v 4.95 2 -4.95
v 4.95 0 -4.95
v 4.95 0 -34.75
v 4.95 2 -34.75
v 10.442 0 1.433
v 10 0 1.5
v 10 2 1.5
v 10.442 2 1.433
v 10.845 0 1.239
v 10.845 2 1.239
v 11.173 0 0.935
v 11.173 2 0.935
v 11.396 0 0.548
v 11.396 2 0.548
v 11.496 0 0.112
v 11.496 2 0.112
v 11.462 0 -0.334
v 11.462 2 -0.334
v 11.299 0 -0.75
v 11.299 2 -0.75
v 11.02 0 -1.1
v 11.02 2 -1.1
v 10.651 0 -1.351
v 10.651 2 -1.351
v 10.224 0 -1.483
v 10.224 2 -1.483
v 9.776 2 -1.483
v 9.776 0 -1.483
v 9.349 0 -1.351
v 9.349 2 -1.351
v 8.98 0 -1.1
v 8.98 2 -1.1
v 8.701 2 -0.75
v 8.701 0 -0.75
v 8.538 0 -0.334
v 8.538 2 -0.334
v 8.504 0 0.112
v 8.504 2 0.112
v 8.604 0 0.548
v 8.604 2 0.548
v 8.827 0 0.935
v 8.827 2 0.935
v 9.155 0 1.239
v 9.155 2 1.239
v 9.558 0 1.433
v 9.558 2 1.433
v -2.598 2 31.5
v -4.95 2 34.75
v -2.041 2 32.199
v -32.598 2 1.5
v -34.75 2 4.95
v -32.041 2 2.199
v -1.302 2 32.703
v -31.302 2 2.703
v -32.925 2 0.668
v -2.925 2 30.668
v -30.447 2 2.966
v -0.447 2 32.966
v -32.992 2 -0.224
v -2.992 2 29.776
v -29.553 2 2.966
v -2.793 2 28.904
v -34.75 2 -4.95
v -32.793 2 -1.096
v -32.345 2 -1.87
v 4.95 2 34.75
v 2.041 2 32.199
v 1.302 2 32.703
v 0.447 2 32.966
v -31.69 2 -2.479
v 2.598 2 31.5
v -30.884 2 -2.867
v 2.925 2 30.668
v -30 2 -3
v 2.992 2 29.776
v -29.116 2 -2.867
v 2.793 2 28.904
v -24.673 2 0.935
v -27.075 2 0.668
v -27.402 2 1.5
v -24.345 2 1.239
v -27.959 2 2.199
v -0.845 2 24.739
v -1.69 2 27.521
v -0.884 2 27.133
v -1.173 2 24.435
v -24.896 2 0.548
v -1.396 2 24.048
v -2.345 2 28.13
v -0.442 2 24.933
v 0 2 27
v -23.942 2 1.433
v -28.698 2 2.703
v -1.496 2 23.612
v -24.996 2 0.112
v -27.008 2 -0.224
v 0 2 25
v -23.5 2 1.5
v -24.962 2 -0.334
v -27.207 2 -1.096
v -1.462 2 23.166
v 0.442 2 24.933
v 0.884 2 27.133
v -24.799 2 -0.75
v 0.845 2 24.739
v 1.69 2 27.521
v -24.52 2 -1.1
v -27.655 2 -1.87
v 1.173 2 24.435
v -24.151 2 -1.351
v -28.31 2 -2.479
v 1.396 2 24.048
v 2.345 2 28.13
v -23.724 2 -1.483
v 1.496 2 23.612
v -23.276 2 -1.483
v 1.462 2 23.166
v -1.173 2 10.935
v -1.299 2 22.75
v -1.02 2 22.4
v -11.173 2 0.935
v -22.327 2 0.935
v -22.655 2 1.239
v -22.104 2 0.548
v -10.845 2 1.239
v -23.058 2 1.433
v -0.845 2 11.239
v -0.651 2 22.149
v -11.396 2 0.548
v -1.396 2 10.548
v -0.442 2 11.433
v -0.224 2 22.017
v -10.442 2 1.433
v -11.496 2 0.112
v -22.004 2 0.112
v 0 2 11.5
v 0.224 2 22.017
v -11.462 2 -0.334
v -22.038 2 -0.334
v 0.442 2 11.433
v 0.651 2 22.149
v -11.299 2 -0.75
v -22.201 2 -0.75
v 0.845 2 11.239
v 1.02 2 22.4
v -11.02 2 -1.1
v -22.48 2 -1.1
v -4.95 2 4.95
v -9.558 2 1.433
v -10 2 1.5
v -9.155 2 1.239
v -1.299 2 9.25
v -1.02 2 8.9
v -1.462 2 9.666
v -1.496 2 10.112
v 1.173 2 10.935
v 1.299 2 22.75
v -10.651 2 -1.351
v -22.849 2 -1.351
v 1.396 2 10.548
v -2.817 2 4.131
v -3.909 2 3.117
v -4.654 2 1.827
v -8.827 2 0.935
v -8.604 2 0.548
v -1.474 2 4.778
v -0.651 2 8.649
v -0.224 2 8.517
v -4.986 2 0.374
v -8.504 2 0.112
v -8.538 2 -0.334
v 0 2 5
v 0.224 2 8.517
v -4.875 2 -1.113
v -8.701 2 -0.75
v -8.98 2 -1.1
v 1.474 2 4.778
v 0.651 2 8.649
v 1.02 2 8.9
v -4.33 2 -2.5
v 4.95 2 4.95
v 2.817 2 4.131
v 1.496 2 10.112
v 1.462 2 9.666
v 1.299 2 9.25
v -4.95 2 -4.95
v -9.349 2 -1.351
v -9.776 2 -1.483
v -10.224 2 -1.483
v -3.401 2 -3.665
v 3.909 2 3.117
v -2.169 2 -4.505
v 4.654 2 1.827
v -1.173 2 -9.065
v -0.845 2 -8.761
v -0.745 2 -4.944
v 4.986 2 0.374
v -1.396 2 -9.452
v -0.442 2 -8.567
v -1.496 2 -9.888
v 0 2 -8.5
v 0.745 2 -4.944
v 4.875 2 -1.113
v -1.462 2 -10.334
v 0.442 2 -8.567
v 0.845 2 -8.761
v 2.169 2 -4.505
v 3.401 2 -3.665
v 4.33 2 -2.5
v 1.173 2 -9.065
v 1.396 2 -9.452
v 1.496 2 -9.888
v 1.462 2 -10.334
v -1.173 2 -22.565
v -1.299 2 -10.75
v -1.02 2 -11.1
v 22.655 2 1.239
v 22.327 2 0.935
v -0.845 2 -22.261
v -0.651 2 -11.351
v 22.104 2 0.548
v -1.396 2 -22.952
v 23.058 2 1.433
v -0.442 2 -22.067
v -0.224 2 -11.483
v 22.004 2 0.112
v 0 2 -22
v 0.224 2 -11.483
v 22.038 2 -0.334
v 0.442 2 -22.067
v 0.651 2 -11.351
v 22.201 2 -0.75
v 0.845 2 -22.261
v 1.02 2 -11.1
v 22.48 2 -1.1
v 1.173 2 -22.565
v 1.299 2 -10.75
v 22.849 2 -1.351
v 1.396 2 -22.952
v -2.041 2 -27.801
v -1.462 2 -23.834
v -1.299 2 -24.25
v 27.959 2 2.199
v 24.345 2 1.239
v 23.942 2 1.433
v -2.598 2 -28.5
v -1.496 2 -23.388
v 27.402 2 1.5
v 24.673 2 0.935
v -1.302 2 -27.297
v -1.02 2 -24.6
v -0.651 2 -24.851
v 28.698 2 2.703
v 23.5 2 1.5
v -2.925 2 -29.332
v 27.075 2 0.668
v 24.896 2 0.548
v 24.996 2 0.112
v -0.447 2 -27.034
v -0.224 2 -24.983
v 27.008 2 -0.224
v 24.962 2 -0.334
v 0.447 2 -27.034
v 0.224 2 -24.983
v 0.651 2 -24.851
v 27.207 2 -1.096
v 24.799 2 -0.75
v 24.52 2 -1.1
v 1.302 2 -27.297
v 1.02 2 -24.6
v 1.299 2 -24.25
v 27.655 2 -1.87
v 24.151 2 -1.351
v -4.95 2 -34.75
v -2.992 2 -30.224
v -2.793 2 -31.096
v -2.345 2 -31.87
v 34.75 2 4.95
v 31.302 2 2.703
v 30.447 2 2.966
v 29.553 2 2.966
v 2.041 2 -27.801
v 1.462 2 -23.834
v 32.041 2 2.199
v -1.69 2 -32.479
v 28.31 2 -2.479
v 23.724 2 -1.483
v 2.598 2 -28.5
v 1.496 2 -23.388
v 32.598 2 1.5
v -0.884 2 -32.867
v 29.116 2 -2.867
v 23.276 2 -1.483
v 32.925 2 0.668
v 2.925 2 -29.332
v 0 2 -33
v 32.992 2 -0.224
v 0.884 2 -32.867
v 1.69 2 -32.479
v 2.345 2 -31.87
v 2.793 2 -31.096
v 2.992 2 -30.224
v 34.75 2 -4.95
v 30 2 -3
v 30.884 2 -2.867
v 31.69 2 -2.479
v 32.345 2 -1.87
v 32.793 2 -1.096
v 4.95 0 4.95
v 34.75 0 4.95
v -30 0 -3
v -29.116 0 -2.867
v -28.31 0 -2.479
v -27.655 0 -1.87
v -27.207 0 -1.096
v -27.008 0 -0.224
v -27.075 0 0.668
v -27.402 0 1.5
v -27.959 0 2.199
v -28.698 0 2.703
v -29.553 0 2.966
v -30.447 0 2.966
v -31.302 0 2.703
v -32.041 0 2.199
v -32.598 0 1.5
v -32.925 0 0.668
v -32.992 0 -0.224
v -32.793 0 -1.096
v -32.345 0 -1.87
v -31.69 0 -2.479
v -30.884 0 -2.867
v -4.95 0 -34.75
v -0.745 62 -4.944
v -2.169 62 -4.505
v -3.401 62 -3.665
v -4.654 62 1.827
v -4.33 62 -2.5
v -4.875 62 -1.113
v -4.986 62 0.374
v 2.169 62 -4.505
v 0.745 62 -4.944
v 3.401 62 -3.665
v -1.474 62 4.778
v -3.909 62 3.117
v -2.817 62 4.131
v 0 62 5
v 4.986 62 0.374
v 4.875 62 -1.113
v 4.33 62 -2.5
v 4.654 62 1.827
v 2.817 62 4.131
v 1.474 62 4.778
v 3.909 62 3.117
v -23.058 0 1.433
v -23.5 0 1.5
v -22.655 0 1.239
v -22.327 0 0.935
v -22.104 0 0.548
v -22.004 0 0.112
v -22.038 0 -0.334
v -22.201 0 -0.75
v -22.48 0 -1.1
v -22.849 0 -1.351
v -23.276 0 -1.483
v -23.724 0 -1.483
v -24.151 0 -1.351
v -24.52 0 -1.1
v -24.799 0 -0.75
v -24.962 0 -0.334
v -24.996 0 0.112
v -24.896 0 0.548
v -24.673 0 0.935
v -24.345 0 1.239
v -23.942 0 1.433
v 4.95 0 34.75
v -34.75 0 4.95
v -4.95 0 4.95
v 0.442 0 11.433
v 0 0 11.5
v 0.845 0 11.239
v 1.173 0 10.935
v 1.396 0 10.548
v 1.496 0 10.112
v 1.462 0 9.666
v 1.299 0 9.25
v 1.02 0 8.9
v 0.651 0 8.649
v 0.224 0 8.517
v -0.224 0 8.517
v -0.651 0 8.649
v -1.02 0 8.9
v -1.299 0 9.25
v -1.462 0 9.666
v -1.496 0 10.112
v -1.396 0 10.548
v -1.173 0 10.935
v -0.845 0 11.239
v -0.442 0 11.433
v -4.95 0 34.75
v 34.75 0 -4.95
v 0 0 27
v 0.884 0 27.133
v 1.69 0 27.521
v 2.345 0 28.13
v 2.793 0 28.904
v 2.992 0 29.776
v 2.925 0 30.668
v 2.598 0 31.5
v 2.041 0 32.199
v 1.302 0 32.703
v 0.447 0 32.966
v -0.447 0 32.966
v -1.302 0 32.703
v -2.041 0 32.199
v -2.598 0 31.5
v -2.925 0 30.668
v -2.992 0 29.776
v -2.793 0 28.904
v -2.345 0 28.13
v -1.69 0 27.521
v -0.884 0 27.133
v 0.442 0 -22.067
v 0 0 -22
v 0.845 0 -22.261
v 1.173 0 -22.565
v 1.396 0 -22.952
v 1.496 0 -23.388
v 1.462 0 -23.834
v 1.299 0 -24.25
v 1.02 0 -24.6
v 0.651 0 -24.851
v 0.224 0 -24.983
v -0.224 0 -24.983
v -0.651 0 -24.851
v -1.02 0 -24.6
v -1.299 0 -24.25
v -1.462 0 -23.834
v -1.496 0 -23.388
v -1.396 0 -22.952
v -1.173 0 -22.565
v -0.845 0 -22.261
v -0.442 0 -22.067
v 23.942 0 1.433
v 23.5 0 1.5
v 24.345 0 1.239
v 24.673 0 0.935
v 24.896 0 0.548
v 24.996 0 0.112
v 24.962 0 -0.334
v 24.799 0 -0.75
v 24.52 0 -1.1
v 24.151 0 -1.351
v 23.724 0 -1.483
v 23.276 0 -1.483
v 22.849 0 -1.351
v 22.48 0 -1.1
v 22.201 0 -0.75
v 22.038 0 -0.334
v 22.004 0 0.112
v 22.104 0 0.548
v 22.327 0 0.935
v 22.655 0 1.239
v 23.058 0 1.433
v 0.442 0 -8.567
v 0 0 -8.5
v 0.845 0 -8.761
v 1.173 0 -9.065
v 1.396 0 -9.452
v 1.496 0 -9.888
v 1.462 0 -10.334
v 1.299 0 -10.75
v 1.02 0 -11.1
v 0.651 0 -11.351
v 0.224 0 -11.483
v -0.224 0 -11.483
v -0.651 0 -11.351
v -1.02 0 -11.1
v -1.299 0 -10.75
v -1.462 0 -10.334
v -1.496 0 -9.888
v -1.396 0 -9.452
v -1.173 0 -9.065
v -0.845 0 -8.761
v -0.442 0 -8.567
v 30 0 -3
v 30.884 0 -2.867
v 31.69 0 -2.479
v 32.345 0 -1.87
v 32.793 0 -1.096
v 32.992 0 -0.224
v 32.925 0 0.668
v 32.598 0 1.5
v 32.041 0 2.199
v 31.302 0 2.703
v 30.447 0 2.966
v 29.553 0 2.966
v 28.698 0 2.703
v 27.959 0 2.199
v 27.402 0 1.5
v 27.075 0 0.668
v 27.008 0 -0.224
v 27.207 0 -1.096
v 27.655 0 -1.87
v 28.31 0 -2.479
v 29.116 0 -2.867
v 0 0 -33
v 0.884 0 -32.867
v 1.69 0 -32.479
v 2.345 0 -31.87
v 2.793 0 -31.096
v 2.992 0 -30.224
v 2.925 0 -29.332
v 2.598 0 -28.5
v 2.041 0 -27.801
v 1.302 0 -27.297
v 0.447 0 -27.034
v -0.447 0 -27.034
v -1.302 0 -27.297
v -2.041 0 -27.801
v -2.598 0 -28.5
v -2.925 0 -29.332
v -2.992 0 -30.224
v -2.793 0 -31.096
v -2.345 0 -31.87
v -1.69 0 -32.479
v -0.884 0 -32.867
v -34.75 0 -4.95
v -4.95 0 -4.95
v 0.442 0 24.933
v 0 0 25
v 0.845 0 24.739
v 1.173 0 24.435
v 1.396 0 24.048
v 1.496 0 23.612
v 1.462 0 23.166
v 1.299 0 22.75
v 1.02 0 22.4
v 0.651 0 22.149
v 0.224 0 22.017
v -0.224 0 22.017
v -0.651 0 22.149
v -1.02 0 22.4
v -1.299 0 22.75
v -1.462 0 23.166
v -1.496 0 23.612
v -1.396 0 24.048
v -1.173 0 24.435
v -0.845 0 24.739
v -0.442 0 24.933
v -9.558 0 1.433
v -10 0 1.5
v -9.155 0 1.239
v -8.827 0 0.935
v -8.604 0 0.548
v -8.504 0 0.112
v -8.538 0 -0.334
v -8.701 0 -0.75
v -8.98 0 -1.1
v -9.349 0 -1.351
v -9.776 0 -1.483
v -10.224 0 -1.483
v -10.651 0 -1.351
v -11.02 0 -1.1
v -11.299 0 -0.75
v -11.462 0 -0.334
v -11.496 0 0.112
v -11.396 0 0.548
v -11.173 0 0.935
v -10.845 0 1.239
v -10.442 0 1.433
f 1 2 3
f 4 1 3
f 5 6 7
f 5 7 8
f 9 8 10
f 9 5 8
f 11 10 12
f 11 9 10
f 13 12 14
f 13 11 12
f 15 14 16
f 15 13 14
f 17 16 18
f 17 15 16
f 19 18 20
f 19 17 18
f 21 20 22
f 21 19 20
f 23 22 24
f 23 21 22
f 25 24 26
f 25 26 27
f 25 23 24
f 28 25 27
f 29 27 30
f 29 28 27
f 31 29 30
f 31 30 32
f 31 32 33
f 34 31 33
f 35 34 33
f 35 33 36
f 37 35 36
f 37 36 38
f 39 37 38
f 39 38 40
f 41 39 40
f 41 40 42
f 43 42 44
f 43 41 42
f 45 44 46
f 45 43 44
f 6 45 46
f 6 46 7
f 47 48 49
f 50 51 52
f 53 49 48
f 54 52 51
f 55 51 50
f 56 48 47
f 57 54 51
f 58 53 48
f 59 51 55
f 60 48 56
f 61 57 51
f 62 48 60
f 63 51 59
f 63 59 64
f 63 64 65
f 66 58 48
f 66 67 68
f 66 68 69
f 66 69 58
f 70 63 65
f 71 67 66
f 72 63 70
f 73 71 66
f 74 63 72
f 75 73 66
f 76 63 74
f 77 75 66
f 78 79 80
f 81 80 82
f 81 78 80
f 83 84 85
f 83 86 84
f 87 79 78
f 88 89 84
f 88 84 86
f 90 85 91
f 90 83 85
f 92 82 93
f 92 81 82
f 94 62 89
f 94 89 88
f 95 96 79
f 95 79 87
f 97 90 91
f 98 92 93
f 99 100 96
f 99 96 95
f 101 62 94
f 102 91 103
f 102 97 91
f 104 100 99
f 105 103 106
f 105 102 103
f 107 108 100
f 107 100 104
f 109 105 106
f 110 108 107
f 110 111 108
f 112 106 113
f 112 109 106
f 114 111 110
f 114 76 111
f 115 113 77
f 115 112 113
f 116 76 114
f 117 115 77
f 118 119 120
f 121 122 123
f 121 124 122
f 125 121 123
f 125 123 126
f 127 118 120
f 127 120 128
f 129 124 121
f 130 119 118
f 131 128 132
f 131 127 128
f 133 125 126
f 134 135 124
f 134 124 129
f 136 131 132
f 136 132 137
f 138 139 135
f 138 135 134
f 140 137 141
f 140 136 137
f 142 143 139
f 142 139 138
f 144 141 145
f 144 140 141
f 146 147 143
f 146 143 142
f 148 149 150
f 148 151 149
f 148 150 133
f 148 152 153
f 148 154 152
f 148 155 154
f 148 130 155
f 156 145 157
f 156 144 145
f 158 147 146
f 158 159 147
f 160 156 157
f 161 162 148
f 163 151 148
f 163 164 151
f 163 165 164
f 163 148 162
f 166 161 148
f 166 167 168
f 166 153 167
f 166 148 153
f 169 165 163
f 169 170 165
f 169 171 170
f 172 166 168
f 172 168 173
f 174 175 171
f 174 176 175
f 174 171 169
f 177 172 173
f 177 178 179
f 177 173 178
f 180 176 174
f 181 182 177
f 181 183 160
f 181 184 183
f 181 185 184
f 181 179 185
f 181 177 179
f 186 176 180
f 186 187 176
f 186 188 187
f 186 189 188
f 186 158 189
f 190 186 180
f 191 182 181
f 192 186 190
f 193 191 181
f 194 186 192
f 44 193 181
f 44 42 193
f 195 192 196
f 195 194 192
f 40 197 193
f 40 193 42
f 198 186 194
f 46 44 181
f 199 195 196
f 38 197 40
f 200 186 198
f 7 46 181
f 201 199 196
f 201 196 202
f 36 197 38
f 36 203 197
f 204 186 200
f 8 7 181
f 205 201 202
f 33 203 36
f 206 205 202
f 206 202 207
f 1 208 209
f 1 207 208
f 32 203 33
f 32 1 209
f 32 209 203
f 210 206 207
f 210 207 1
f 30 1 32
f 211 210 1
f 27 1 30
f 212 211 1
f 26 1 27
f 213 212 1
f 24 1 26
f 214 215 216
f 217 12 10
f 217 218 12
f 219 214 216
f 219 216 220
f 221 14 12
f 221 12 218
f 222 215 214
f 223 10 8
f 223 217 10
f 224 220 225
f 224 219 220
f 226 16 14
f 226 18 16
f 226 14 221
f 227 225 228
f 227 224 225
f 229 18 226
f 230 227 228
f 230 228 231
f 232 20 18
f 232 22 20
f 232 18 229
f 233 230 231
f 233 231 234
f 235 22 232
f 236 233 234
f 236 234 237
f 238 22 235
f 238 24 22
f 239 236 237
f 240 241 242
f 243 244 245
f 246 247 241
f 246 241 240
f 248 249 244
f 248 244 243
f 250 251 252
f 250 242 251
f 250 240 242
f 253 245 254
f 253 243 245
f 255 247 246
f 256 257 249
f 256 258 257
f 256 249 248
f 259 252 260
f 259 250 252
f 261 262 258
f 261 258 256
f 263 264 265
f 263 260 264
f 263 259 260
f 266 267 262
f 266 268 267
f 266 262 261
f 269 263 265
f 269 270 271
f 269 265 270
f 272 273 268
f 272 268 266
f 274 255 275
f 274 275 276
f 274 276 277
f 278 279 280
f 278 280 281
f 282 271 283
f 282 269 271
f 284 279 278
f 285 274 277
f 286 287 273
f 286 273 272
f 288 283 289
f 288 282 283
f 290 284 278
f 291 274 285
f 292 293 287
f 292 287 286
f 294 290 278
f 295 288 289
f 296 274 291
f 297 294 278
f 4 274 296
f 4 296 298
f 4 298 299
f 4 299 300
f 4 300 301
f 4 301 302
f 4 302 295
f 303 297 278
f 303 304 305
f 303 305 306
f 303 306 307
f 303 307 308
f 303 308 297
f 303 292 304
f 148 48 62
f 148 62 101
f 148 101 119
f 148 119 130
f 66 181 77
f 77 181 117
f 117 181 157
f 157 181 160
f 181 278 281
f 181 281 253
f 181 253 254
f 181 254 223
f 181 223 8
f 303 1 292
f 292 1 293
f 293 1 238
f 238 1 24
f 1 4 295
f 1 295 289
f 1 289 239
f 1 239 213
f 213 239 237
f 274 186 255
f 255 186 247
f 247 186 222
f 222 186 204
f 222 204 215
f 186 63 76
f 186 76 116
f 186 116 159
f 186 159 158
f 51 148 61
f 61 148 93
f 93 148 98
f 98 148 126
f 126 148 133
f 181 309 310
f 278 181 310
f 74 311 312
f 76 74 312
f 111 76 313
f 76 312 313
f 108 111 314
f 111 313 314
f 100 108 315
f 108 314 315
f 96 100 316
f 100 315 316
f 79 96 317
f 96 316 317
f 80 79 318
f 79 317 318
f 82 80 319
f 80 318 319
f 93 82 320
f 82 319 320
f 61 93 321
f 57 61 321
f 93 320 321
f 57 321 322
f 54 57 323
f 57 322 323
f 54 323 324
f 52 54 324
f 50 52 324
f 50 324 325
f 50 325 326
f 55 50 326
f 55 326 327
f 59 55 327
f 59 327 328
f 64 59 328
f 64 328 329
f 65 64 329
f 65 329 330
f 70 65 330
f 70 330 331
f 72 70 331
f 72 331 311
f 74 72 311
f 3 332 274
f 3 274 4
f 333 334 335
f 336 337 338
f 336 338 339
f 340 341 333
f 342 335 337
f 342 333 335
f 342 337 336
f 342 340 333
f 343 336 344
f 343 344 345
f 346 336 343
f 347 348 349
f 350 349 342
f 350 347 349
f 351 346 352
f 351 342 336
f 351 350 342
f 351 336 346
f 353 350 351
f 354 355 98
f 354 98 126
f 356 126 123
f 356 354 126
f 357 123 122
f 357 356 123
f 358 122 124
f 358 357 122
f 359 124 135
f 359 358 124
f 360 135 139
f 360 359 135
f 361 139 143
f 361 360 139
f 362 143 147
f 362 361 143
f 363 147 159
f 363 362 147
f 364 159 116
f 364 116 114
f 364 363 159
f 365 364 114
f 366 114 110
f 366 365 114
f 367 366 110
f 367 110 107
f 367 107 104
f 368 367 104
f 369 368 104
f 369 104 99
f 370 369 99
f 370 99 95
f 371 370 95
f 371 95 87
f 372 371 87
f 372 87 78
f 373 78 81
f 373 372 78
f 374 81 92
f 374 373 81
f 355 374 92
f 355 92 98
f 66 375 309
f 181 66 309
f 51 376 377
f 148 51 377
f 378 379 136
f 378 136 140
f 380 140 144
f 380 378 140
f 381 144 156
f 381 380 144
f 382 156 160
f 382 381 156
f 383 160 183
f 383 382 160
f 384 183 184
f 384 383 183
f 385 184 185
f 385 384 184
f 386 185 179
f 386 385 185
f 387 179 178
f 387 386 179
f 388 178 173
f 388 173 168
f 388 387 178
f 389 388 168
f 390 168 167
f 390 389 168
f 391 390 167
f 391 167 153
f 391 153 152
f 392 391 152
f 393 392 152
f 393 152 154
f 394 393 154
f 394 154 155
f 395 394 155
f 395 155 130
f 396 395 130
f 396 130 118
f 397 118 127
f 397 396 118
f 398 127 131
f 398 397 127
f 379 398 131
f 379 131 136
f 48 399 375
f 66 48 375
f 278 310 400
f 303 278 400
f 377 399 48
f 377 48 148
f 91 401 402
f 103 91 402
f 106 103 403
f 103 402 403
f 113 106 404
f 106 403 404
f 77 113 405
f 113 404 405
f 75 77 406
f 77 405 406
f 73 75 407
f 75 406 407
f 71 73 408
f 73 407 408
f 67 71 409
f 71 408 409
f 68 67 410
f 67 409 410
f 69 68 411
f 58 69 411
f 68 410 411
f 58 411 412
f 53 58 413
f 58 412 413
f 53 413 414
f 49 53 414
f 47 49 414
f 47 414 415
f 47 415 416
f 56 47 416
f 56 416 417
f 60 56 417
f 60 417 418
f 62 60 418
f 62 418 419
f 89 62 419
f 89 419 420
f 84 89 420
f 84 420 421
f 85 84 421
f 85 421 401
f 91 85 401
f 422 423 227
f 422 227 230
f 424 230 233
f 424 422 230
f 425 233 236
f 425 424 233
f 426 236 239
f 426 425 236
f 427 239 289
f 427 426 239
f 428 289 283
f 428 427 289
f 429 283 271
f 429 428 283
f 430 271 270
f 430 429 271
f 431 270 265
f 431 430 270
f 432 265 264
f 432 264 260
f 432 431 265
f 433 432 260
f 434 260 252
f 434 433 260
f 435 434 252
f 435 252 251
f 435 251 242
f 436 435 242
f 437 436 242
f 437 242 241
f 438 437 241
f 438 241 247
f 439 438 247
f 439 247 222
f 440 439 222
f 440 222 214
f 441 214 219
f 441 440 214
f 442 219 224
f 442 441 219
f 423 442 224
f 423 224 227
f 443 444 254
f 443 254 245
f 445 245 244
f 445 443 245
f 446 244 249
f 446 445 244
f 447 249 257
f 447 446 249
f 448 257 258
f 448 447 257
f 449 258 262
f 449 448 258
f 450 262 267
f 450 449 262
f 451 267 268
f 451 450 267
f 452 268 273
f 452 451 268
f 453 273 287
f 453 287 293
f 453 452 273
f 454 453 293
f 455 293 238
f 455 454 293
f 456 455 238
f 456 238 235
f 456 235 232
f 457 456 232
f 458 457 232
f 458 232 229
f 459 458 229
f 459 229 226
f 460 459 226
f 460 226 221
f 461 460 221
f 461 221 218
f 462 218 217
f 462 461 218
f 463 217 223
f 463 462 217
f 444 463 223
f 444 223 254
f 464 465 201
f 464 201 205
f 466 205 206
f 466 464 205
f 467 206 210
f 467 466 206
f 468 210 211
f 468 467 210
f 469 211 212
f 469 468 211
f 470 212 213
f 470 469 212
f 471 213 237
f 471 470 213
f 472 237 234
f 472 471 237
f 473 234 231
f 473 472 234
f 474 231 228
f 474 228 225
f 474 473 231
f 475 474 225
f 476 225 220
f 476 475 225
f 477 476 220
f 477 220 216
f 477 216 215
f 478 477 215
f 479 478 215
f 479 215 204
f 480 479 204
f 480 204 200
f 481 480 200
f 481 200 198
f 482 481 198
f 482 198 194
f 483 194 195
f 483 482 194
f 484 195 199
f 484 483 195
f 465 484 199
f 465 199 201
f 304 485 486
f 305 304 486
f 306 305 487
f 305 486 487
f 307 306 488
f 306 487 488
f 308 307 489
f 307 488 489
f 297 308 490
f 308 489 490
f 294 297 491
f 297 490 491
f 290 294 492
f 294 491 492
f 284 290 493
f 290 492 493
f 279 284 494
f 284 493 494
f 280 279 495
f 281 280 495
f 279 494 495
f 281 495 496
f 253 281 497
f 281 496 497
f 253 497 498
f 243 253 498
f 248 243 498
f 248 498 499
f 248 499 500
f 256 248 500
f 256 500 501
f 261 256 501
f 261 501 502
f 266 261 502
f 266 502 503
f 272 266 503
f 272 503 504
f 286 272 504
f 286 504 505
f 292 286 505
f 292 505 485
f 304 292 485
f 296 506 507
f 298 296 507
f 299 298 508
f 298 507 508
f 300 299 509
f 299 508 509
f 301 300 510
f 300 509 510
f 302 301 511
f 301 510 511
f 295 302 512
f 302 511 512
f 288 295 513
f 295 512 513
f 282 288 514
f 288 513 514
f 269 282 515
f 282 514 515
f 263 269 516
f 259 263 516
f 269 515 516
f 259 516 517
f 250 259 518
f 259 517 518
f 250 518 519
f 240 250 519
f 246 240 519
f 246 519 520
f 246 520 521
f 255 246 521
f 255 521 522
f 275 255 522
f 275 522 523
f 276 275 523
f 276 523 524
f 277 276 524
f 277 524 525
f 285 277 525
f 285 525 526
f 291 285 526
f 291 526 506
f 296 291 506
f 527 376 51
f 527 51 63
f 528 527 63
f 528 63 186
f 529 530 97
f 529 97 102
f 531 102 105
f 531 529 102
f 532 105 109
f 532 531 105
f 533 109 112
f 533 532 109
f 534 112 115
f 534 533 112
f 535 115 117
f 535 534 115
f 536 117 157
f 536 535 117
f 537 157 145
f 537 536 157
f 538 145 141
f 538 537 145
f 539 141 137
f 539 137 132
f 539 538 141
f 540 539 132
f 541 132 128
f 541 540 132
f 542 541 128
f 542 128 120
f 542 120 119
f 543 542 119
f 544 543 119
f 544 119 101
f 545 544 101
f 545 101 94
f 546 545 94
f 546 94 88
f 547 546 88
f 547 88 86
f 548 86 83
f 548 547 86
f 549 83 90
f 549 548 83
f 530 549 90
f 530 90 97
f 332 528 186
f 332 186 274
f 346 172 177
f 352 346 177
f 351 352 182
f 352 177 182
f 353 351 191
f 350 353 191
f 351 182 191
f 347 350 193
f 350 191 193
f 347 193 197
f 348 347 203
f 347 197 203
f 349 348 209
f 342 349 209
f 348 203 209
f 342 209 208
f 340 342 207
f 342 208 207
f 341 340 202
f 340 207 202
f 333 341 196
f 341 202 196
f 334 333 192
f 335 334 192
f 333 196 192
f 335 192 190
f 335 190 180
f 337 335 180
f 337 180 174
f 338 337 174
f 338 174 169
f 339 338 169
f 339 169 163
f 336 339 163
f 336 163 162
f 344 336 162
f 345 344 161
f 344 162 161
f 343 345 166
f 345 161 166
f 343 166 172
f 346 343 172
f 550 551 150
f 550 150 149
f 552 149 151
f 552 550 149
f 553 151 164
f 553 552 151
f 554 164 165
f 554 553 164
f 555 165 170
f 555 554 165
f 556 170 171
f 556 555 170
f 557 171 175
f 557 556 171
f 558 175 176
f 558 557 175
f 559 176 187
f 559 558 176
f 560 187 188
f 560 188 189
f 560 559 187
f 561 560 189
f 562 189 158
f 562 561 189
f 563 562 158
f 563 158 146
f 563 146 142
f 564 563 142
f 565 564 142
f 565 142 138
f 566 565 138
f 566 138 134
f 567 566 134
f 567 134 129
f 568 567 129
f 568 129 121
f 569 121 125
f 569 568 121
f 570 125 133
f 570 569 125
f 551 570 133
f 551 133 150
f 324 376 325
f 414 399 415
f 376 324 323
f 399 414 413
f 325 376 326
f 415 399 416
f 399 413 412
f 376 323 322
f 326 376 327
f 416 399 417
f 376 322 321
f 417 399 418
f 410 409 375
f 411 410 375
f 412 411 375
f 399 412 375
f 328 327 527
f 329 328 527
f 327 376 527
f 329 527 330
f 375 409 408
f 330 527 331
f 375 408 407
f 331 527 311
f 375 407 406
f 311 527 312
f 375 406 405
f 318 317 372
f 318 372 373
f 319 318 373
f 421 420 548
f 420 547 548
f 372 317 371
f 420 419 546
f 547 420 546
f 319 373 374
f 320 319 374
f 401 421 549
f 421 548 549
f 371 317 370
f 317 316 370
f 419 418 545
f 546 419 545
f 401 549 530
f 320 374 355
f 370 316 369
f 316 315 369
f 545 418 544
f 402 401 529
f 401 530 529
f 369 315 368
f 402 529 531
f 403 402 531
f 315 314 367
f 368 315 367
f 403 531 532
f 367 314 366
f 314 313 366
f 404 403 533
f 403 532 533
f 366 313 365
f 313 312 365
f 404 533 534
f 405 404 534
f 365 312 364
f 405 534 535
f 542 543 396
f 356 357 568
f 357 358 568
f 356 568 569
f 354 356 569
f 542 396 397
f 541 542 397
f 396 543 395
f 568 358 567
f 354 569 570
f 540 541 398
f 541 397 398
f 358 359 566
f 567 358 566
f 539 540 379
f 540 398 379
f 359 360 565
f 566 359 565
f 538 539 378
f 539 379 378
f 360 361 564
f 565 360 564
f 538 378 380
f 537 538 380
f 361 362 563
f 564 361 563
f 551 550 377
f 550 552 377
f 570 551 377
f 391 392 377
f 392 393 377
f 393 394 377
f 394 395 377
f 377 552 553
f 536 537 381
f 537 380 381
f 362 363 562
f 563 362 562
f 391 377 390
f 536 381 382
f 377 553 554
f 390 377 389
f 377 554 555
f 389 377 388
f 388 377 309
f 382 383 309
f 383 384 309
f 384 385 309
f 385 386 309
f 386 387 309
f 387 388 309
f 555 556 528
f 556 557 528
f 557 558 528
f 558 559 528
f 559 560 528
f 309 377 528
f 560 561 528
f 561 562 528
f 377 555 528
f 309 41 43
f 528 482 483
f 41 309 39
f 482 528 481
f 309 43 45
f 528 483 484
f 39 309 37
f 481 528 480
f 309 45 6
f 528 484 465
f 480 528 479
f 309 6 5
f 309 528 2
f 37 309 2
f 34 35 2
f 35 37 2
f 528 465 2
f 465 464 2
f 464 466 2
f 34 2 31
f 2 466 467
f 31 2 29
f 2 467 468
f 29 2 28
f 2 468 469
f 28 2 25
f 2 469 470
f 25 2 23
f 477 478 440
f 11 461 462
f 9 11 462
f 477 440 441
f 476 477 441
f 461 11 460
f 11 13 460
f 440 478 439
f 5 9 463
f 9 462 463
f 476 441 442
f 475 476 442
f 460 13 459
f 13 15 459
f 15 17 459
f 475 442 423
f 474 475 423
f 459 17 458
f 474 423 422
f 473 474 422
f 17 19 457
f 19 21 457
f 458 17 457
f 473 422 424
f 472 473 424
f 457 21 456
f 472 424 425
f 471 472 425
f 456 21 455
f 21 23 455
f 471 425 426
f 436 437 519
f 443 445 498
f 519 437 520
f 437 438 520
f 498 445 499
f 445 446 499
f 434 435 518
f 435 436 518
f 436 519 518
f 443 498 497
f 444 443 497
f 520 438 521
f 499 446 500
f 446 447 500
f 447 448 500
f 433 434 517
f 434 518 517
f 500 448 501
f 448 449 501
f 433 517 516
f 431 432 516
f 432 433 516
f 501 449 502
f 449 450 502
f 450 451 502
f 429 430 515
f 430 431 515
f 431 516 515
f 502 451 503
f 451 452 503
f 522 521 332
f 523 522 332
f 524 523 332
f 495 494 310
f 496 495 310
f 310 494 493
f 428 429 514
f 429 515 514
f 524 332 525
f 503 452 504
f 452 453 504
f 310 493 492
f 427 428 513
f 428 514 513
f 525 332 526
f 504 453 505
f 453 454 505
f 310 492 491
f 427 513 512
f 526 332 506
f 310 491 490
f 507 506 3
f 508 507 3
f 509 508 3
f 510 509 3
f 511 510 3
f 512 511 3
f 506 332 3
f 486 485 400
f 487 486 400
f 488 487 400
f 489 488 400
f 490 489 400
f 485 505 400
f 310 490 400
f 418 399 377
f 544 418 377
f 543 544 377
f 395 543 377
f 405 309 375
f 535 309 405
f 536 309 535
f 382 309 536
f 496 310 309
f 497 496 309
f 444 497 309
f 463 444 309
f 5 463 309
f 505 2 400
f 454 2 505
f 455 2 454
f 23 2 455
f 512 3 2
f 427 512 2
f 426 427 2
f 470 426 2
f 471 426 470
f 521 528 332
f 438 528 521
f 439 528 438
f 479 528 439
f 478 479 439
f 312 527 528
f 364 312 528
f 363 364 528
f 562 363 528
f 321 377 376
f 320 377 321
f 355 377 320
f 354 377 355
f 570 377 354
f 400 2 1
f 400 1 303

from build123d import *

# Parameters (mm, degrees)
SKETCH_2_W          = 69.5
SKETCH_2_H          = 9.9
SKETCH_2_R          = 1.5
SKETCH_2_W_2        = 9.9
SKETCH_2_H_2        = 69.5
EXTRUDE_5_DEPTH     = 2
SKETCH_4_R          = 5
EXTRUDE_8_DEPTH     = 60
SKETCH_6_R          = 3
CUT_EXTRUDE_1_DEPTH = 80.114632022


with BuildPart() as part:
    # 草图2 → 凸台-拉伸5 (new body)
    # profile 1 of 2: a face of its own
    with BuildSketch(Plane(origin=(0, 0, 0), x_dir=(1, 0, 0), z_dir=(0, 1, 0))):
        Rectangle(SKETCH_2_W, SKETCH_2_H)
        with Locations(Location((23.5, 0, 0), (0, 0, 270))):
            Circle(SKETCH_2_R, mode=Mode.SUBTRACT)
        with Locations(Location((10, 0, 0), (0, 0, 270))):
            Circle(SKETCH_2_R, mode=Mode.SUBTRACT)
        with Locations(Location((-23.5, 0, 0), (0, 0, 270))):
            Circle(SKETCH_2_R, mode=Mode.SUBTRACT)
        with Locations(Location((-10, 0, 0), (0, 0, 270))):
            Circle(SKETCH_2_R, mode=Mode.SUBTRACT)
    # profile 2 of 2: a face of its own
    with BuildSketch(Plane(origin=(0, 0, 0), x_dir=(1, 0, 0), z_dir=(0, 1, 0))):
        Rectangle(SKETCH_2_W_2, SKETCH_2_H_2)
        with Locations(Location((0, 10, 0), (0, 0, 270))):
            Circle(SKETCH_2_R, mode=Mode.SUBTRACT)
        with Locations(Location((0, 23.5, 0), (0, 0, 270))):
            Circle(SKETCH_2_R, mode=Mode.SUBTRACT)
        with Locations(Location((0, -23.5, 0), (0, 0, 270))):
            Circle(SKETCH_2_R, mode=Mode.SUBTRACT)
        with Locations(Location((0, -10, 0), (0, 0, 270))):
            Circle(SKETCH_2_R, mode=Mode.SUBTRACT)
    extrude(amount=EXTRUDE_5_DEPTH)

    # 草图4 → 凸台-拉伸8 (add)
    with BuildSketch(Plane(origin=(0, 2, 0), x_dir=(1, 0, 0), z_dir=(0, 1, 0))):
        with Locations(Location((0, 0, 0), (0, 0, 270))):
            Circle(SKETCH_4_R)
    extrude(amount=EXTRUDE_8_DEPTH)

    # 草图6 → 切除-拉伸1 (cut, through all)
    with BuildSketch(Plane.XZ):
        with Locations(Location((0, -30, 0), (0, 0, 270))):
            Circle(SKETCH_6_R)
        with Locations(Location((-30, 0, 0), (0, 0, 270))):
            Circle(SKETCH_6_R)
        with Locations(Location((0, 30, 0), (0, 0, 270))):
            Circle(SKETCH_6_R)
        with Locations(Location((30, 0, 0), (0, 0, 270))):
            Circle(SKETCH_6_R)
    extrude(amount=-CUT_EXTRUDE_1_DEPTH, mode=Mode.SUBTRACT)


solid = part.part
